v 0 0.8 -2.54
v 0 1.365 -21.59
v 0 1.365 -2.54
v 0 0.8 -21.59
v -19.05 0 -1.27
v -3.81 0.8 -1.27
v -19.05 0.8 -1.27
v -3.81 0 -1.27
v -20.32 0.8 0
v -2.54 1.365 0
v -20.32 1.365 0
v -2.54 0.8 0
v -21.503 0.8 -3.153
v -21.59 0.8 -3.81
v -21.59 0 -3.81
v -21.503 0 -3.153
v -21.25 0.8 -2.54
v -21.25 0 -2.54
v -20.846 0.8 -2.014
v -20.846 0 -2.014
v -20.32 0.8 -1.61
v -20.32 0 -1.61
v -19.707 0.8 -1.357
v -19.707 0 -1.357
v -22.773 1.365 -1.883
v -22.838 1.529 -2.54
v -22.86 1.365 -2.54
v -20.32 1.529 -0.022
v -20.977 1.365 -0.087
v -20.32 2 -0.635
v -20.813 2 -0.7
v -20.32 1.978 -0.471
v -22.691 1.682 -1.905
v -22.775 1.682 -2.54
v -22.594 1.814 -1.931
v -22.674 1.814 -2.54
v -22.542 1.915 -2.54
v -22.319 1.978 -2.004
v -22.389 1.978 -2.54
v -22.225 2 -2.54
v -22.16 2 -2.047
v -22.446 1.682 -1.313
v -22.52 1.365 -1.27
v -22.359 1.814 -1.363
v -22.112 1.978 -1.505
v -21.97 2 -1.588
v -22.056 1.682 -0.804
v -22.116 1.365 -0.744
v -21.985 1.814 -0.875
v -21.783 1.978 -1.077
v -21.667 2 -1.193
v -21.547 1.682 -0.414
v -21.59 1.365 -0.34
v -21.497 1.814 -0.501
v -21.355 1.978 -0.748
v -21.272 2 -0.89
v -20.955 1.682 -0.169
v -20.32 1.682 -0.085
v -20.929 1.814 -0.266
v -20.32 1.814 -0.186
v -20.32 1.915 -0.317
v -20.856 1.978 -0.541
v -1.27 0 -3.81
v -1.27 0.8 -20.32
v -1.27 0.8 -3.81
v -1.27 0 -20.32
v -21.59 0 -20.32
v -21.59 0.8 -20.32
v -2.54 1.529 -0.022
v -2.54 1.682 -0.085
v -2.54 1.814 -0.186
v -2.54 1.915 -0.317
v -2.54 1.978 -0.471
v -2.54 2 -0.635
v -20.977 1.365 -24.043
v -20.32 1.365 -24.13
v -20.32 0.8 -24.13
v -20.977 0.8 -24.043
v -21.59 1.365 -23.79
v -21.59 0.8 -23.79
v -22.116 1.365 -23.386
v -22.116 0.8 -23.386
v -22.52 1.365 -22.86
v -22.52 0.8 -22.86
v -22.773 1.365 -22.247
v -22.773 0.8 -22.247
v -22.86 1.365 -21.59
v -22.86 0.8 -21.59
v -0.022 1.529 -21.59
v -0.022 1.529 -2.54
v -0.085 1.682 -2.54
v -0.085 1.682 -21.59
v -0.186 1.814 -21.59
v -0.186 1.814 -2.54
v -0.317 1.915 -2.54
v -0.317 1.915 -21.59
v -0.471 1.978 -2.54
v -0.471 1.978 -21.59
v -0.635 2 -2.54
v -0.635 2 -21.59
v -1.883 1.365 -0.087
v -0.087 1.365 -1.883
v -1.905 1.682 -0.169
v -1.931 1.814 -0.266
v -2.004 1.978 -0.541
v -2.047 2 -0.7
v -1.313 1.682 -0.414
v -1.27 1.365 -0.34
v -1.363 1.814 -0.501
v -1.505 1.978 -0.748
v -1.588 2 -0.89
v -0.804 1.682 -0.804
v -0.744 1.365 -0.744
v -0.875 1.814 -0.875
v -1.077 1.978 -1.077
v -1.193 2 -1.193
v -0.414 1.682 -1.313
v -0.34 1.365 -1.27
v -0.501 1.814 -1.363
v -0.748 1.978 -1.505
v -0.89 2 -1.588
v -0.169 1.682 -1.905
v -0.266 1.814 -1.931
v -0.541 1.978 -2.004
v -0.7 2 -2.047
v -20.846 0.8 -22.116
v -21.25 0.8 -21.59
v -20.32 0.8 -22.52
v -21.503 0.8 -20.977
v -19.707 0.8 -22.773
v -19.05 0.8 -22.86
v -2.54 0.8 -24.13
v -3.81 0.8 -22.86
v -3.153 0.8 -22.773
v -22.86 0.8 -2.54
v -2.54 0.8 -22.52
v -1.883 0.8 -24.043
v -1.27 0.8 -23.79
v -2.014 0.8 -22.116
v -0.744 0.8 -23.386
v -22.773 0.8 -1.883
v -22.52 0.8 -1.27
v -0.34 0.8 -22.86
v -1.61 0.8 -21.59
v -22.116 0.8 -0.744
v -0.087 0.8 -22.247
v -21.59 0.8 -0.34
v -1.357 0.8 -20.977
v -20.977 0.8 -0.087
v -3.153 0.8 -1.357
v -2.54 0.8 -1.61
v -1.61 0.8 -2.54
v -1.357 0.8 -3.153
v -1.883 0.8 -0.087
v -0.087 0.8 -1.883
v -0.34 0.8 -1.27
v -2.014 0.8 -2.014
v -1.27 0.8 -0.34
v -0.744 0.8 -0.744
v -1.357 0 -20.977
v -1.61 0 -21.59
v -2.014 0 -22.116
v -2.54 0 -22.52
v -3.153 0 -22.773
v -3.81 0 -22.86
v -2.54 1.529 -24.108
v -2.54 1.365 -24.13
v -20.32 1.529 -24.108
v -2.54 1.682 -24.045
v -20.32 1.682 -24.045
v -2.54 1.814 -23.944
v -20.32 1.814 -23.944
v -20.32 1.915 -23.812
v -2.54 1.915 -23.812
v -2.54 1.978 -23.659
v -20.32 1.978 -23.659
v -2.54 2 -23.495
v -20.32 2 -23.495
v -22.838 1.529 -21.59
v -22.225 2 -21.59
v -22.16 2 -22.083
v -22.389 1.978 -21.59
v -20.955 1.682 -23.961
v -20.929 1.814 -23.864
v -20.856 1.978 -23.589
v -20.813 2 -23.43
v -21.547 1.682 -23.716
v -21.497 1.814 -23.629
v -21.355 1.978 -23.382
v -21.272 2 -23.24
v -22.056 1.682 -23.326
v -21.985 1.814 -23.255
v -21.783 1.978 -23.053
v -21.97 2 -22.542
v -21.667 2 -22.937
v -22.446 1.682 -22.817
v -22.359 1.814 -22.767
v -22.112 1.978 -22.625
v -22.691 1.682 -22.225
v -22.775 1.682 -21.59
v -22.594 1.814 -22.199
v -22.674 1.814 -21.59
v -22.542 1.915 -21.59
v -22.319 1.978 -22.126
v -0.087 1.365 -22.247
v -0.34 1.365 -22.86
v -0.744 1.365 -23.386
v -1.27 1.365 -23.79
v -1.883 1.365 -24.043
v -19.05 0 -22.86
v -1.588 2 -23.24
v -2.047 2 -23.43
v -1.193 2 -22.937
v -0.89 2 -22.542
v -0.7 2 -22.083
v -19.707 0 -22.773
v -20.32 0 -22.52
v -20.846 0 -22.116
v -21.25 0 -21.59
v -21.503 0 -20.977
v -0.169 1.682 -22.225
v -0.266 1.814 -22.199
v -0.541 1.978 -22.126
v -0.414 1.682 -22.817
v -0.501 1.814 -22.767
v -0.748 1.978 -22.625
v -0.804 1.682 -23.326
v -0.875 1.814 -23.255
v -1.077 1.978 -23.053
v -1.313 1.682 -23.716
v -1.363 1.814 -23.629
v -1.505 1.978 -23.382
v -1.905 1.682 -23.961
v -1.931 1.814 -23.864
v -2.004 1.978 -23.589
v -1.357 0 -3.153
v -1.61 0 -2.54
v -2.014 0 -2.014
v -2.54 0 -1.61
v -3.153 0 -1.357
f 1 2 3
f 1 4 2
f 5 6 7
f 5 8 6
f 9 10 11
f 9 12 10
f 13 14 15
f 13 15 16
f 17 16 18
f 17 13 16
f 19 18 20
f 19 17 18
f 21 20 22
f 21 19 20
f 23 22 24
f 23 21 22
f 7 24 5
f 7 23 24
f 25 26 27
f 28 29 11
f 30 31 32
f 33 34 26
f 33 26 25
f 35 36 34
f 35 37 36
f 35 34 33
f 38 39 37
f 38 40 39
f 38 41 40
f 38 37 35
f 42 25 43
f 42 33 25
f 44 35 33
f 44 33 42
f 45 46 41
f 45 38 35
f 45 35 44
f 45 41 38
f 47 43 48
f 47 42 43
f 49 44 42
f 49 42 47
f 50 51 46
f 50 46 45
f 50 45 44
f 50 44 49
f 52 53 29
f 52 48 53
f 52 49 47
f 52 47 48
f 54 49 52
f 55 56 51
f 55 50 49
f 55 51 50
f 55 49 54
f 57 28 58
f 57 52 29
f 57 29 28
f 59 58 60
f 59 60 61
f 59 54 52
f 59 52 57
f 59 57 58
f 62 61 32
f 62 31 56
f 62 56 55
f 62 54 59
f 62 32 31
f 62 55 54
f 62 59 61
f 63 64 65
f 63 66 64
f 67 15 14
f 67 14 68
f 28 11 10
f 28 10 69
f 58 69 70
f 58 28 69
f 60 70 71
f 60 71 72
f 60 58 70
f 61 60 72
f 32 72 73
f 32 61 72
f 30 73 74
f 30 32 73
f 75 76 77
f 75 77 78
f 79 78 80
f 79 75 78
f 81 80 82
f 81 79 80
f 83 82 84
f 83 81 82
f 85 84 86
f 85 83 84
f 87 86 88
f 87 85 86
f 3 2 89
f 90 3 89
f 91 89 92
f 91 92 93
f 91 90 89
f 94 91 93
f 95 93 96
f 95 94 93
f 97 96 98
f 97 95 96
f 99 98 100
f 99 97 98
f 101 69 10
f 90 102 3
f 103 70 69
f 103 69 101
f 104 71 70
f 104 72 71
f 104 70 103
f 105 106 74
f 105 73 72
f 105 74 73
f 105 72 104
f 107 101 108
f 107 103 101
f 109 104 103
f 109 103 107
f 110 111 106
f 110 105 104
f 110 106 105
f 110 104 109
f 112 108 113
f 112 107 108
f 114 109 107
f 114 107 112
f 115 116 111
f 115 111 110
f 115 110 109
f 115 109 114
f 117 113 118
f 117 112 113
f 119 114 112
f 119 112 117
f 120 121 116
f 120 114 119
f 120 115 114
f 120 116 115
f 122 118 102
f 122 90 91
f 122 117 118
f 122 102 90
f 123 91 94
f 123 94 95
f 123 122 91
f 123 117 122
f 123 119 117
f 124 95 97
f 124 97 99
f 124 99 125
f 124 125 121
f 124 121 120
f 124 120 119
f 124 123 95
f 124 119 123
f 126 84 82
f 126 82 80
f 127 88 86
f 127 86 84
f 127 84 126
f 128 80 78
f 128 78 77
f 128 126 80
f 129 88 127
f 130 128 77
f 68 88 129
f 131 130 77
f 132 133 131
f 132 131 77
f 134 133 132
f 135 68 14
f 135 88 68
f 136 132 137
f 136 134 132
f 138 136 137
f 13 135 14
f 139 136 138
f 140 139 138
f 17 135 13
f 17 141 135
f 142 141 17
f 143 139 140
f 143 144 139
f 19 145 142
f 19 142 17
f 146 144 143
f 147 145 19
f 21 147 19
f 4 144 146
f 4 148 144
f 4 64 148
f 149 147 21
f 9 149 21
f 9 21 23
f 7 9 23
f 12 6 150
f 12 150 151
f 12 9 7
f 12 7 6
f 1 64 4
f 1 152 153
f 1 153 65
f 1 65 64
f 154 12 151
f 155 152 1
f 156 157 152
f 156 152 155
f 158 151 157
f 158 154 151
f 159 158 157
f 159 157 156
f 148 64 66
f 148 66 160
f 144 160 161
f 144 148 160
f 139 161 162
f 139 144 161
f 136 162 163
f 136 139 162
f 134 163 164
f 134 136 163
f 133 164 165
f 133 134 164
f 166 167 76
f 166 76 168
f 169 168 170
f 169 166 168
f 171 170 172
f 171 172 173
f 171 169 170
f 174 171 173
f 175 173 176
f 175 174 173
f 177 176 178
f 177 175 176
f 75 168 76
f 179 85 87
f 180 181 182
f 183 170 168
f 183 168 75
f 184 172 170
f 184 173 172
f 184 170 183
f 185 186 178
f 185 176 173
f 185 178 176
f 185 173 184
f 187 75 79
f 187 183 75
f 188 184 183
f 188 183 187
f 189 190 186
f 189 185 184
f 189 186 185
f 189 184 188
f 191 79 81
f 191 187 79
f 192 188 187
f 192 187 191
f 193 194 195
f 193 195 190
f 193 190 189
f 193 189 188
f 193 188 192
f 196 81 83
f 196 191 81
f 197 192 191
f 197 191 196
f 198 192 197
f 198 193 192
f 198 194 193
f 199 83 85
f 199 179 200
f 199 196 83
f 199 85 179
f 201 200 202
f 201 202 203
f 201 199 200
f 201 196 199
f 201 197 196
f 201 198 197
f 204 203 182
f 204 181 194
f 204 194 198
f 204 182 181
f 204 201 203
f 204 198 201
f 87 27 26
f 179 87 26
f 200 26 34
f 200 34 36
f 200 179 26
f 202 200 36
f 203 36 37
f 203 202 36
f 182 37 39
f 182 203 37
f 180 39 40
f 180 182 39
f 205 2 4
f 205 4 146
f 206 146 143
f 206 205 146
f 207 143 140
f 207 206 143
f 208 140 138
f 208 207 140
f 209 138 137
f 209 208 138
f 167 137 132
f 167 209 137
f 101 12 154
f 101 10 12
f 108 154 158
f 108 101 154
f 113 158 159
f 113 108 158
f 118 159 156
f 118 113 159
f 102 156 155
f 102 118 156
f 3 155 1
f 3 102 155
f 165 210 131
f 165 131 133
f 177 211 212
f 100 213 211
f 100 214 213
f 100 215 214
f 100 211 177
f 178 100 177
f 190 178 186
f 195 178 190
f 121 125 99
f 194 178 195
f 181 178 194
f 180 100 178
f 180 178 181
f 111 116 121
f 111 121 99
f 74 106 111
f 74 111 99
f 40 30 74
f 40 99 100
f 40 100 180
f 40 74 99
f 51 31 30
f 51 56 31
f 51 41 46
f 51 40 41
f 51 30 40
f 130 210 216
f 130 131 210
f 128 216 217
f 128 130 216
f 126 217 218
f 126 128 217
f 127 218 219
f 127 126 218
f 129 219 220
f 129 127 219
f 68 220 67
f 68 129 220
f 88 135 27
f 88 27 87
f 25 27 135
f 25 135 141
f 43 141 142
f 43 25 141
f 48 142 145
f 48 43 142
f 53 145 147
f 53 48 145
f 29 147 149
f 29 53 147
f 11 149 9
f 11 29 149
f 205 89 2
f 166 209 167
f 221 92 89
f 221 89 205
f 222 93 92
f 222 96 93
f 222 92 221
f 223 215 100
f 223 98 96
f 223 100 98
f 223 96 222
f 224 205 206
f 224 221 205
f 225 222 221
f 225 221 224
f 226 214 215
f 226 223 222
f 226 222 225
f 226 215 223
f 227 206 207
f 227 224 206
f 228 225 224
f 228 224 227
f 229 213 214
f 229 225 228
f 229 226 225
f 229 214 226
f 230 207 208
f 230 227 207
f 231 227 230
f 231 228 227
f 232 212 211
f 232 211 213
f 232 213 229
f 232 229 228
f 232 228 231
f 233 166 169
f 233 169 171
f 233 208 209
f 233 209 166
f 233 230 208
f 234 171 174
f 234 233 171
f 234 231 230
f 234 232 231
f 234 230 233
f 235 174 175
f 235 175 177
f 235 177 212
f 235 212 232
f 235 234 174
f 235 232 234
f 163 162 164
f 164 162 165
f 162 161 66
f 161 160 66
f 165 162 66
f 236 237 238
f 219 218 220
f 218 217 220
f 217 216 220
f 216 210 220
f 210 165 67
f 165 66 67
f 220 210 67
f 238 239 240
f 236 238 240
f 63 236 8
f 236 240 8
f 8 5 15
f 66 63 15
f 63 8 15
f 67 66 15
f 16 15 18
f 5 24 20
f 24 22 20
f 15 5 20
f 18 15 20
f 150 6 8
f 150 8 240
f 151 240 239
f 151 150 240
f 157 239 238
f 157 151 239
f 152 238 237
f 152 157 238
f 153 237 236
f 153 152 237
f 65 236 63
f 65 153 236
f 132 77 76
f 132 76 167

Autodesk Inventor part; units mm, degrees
ref_plane "YZ Plane" through (0, 0, 0) normal (1, 0, 0) x (0, 1, 0)
ref_plane "XZ Plane" through (0, 0, 0) normal (0, 1, 0) x (-1, 0, 0)
ref_plane "XY Plane" through (0, 0, 0) normal (0, 0, 1) x (1, 0, 0)
sketch "Sketch1" plane through (0, 0, 0) normal (0, 1, 0) x (-1, 0, 0)
  line L0 (0, 0) -> (22.86, 0)
  line L1 (22.86, 0) -> (22.86, -24.13)
  line L2 (22.86, -24.13) -> (0, -24.13)
  line L3 (0, -24.13) -> (0, 0)
  dimension "d0" = 24.13
  dimension "d1" = 22.86
extrude "Extrusion1" add sketch "Sketch1" along normal blind 2
sketch "Sketch2" plane through (0, 0, 0) normal (0, -1, 0) x (1, 0, 0)
  line L0 (-1.27, -1.27) -> (-21.59, -1.27)
  line L1 (-21.59, -1.27) -> (-21.59, -22.86)
  line L2 (-21.59, -22.86) -> (-1.27, -22.86)
  line L3 (-1.27, -22.86) -> (-1.27, -1.27)
  line L4 (-22.86, 0) -> (0, 0) projected
  line L5 (0, -24.13) -> (-22.86, -24.13) projected
  line L6 (0, 0) -> (0, -24.13) projected
  line L7 (-22.86, -24.13) -> (-22.86, 0) projected
  line L8 (0, 0) -> (0, -24.13) projected
  line L9 (0, 0) -> (-22.86, 0)
  line L10 (-22.86, 0) -> (-22.86, -24.13)
  line L11 (-22.86, -24.13) -> (0, -24.13)
  line L12 (0, -24.13) -> (0, 0)
  dimension "d4" = 20.32
  dimension "d5" = 21.59
  dimension "d6" = 1.27
  dimension "d7" = 1.27
  dimension "d8" = 1.27
  dimension "d9" = 1.27
extrude "Extrusion2" cut sketch "Sketch2" against normal blind 0.8
fillet "Fillet1" radius 2.54 8 edges at (0, 1.4, 0) (0, 1.4, -24.13) (-22.86, 1.4, -24.13) (-22.86, 1.4, 0) (-21.59, 0.4, -1.27) (-1.27, 0.4, -1.27) (-1.27, 0.4, -22.86) (-21.59, 0.4, -22.86)
fillet "Fillet2" radius 0.635 8 edges at (-22.1161, 2, -0.7439) (-11.43, 2, 0) (-0.7439, 2, -0.7439) (0, 2, -12.065) (-0.7439, 2, -23.3861) (-11.43, 2, -24.13) (-22.1161, 2, -23.3861) (-22.86, 2, -12.065)
equation "\"d6\" = d7"
equation "\"d8\" = d9"
properties part number "micro lipo lid"
